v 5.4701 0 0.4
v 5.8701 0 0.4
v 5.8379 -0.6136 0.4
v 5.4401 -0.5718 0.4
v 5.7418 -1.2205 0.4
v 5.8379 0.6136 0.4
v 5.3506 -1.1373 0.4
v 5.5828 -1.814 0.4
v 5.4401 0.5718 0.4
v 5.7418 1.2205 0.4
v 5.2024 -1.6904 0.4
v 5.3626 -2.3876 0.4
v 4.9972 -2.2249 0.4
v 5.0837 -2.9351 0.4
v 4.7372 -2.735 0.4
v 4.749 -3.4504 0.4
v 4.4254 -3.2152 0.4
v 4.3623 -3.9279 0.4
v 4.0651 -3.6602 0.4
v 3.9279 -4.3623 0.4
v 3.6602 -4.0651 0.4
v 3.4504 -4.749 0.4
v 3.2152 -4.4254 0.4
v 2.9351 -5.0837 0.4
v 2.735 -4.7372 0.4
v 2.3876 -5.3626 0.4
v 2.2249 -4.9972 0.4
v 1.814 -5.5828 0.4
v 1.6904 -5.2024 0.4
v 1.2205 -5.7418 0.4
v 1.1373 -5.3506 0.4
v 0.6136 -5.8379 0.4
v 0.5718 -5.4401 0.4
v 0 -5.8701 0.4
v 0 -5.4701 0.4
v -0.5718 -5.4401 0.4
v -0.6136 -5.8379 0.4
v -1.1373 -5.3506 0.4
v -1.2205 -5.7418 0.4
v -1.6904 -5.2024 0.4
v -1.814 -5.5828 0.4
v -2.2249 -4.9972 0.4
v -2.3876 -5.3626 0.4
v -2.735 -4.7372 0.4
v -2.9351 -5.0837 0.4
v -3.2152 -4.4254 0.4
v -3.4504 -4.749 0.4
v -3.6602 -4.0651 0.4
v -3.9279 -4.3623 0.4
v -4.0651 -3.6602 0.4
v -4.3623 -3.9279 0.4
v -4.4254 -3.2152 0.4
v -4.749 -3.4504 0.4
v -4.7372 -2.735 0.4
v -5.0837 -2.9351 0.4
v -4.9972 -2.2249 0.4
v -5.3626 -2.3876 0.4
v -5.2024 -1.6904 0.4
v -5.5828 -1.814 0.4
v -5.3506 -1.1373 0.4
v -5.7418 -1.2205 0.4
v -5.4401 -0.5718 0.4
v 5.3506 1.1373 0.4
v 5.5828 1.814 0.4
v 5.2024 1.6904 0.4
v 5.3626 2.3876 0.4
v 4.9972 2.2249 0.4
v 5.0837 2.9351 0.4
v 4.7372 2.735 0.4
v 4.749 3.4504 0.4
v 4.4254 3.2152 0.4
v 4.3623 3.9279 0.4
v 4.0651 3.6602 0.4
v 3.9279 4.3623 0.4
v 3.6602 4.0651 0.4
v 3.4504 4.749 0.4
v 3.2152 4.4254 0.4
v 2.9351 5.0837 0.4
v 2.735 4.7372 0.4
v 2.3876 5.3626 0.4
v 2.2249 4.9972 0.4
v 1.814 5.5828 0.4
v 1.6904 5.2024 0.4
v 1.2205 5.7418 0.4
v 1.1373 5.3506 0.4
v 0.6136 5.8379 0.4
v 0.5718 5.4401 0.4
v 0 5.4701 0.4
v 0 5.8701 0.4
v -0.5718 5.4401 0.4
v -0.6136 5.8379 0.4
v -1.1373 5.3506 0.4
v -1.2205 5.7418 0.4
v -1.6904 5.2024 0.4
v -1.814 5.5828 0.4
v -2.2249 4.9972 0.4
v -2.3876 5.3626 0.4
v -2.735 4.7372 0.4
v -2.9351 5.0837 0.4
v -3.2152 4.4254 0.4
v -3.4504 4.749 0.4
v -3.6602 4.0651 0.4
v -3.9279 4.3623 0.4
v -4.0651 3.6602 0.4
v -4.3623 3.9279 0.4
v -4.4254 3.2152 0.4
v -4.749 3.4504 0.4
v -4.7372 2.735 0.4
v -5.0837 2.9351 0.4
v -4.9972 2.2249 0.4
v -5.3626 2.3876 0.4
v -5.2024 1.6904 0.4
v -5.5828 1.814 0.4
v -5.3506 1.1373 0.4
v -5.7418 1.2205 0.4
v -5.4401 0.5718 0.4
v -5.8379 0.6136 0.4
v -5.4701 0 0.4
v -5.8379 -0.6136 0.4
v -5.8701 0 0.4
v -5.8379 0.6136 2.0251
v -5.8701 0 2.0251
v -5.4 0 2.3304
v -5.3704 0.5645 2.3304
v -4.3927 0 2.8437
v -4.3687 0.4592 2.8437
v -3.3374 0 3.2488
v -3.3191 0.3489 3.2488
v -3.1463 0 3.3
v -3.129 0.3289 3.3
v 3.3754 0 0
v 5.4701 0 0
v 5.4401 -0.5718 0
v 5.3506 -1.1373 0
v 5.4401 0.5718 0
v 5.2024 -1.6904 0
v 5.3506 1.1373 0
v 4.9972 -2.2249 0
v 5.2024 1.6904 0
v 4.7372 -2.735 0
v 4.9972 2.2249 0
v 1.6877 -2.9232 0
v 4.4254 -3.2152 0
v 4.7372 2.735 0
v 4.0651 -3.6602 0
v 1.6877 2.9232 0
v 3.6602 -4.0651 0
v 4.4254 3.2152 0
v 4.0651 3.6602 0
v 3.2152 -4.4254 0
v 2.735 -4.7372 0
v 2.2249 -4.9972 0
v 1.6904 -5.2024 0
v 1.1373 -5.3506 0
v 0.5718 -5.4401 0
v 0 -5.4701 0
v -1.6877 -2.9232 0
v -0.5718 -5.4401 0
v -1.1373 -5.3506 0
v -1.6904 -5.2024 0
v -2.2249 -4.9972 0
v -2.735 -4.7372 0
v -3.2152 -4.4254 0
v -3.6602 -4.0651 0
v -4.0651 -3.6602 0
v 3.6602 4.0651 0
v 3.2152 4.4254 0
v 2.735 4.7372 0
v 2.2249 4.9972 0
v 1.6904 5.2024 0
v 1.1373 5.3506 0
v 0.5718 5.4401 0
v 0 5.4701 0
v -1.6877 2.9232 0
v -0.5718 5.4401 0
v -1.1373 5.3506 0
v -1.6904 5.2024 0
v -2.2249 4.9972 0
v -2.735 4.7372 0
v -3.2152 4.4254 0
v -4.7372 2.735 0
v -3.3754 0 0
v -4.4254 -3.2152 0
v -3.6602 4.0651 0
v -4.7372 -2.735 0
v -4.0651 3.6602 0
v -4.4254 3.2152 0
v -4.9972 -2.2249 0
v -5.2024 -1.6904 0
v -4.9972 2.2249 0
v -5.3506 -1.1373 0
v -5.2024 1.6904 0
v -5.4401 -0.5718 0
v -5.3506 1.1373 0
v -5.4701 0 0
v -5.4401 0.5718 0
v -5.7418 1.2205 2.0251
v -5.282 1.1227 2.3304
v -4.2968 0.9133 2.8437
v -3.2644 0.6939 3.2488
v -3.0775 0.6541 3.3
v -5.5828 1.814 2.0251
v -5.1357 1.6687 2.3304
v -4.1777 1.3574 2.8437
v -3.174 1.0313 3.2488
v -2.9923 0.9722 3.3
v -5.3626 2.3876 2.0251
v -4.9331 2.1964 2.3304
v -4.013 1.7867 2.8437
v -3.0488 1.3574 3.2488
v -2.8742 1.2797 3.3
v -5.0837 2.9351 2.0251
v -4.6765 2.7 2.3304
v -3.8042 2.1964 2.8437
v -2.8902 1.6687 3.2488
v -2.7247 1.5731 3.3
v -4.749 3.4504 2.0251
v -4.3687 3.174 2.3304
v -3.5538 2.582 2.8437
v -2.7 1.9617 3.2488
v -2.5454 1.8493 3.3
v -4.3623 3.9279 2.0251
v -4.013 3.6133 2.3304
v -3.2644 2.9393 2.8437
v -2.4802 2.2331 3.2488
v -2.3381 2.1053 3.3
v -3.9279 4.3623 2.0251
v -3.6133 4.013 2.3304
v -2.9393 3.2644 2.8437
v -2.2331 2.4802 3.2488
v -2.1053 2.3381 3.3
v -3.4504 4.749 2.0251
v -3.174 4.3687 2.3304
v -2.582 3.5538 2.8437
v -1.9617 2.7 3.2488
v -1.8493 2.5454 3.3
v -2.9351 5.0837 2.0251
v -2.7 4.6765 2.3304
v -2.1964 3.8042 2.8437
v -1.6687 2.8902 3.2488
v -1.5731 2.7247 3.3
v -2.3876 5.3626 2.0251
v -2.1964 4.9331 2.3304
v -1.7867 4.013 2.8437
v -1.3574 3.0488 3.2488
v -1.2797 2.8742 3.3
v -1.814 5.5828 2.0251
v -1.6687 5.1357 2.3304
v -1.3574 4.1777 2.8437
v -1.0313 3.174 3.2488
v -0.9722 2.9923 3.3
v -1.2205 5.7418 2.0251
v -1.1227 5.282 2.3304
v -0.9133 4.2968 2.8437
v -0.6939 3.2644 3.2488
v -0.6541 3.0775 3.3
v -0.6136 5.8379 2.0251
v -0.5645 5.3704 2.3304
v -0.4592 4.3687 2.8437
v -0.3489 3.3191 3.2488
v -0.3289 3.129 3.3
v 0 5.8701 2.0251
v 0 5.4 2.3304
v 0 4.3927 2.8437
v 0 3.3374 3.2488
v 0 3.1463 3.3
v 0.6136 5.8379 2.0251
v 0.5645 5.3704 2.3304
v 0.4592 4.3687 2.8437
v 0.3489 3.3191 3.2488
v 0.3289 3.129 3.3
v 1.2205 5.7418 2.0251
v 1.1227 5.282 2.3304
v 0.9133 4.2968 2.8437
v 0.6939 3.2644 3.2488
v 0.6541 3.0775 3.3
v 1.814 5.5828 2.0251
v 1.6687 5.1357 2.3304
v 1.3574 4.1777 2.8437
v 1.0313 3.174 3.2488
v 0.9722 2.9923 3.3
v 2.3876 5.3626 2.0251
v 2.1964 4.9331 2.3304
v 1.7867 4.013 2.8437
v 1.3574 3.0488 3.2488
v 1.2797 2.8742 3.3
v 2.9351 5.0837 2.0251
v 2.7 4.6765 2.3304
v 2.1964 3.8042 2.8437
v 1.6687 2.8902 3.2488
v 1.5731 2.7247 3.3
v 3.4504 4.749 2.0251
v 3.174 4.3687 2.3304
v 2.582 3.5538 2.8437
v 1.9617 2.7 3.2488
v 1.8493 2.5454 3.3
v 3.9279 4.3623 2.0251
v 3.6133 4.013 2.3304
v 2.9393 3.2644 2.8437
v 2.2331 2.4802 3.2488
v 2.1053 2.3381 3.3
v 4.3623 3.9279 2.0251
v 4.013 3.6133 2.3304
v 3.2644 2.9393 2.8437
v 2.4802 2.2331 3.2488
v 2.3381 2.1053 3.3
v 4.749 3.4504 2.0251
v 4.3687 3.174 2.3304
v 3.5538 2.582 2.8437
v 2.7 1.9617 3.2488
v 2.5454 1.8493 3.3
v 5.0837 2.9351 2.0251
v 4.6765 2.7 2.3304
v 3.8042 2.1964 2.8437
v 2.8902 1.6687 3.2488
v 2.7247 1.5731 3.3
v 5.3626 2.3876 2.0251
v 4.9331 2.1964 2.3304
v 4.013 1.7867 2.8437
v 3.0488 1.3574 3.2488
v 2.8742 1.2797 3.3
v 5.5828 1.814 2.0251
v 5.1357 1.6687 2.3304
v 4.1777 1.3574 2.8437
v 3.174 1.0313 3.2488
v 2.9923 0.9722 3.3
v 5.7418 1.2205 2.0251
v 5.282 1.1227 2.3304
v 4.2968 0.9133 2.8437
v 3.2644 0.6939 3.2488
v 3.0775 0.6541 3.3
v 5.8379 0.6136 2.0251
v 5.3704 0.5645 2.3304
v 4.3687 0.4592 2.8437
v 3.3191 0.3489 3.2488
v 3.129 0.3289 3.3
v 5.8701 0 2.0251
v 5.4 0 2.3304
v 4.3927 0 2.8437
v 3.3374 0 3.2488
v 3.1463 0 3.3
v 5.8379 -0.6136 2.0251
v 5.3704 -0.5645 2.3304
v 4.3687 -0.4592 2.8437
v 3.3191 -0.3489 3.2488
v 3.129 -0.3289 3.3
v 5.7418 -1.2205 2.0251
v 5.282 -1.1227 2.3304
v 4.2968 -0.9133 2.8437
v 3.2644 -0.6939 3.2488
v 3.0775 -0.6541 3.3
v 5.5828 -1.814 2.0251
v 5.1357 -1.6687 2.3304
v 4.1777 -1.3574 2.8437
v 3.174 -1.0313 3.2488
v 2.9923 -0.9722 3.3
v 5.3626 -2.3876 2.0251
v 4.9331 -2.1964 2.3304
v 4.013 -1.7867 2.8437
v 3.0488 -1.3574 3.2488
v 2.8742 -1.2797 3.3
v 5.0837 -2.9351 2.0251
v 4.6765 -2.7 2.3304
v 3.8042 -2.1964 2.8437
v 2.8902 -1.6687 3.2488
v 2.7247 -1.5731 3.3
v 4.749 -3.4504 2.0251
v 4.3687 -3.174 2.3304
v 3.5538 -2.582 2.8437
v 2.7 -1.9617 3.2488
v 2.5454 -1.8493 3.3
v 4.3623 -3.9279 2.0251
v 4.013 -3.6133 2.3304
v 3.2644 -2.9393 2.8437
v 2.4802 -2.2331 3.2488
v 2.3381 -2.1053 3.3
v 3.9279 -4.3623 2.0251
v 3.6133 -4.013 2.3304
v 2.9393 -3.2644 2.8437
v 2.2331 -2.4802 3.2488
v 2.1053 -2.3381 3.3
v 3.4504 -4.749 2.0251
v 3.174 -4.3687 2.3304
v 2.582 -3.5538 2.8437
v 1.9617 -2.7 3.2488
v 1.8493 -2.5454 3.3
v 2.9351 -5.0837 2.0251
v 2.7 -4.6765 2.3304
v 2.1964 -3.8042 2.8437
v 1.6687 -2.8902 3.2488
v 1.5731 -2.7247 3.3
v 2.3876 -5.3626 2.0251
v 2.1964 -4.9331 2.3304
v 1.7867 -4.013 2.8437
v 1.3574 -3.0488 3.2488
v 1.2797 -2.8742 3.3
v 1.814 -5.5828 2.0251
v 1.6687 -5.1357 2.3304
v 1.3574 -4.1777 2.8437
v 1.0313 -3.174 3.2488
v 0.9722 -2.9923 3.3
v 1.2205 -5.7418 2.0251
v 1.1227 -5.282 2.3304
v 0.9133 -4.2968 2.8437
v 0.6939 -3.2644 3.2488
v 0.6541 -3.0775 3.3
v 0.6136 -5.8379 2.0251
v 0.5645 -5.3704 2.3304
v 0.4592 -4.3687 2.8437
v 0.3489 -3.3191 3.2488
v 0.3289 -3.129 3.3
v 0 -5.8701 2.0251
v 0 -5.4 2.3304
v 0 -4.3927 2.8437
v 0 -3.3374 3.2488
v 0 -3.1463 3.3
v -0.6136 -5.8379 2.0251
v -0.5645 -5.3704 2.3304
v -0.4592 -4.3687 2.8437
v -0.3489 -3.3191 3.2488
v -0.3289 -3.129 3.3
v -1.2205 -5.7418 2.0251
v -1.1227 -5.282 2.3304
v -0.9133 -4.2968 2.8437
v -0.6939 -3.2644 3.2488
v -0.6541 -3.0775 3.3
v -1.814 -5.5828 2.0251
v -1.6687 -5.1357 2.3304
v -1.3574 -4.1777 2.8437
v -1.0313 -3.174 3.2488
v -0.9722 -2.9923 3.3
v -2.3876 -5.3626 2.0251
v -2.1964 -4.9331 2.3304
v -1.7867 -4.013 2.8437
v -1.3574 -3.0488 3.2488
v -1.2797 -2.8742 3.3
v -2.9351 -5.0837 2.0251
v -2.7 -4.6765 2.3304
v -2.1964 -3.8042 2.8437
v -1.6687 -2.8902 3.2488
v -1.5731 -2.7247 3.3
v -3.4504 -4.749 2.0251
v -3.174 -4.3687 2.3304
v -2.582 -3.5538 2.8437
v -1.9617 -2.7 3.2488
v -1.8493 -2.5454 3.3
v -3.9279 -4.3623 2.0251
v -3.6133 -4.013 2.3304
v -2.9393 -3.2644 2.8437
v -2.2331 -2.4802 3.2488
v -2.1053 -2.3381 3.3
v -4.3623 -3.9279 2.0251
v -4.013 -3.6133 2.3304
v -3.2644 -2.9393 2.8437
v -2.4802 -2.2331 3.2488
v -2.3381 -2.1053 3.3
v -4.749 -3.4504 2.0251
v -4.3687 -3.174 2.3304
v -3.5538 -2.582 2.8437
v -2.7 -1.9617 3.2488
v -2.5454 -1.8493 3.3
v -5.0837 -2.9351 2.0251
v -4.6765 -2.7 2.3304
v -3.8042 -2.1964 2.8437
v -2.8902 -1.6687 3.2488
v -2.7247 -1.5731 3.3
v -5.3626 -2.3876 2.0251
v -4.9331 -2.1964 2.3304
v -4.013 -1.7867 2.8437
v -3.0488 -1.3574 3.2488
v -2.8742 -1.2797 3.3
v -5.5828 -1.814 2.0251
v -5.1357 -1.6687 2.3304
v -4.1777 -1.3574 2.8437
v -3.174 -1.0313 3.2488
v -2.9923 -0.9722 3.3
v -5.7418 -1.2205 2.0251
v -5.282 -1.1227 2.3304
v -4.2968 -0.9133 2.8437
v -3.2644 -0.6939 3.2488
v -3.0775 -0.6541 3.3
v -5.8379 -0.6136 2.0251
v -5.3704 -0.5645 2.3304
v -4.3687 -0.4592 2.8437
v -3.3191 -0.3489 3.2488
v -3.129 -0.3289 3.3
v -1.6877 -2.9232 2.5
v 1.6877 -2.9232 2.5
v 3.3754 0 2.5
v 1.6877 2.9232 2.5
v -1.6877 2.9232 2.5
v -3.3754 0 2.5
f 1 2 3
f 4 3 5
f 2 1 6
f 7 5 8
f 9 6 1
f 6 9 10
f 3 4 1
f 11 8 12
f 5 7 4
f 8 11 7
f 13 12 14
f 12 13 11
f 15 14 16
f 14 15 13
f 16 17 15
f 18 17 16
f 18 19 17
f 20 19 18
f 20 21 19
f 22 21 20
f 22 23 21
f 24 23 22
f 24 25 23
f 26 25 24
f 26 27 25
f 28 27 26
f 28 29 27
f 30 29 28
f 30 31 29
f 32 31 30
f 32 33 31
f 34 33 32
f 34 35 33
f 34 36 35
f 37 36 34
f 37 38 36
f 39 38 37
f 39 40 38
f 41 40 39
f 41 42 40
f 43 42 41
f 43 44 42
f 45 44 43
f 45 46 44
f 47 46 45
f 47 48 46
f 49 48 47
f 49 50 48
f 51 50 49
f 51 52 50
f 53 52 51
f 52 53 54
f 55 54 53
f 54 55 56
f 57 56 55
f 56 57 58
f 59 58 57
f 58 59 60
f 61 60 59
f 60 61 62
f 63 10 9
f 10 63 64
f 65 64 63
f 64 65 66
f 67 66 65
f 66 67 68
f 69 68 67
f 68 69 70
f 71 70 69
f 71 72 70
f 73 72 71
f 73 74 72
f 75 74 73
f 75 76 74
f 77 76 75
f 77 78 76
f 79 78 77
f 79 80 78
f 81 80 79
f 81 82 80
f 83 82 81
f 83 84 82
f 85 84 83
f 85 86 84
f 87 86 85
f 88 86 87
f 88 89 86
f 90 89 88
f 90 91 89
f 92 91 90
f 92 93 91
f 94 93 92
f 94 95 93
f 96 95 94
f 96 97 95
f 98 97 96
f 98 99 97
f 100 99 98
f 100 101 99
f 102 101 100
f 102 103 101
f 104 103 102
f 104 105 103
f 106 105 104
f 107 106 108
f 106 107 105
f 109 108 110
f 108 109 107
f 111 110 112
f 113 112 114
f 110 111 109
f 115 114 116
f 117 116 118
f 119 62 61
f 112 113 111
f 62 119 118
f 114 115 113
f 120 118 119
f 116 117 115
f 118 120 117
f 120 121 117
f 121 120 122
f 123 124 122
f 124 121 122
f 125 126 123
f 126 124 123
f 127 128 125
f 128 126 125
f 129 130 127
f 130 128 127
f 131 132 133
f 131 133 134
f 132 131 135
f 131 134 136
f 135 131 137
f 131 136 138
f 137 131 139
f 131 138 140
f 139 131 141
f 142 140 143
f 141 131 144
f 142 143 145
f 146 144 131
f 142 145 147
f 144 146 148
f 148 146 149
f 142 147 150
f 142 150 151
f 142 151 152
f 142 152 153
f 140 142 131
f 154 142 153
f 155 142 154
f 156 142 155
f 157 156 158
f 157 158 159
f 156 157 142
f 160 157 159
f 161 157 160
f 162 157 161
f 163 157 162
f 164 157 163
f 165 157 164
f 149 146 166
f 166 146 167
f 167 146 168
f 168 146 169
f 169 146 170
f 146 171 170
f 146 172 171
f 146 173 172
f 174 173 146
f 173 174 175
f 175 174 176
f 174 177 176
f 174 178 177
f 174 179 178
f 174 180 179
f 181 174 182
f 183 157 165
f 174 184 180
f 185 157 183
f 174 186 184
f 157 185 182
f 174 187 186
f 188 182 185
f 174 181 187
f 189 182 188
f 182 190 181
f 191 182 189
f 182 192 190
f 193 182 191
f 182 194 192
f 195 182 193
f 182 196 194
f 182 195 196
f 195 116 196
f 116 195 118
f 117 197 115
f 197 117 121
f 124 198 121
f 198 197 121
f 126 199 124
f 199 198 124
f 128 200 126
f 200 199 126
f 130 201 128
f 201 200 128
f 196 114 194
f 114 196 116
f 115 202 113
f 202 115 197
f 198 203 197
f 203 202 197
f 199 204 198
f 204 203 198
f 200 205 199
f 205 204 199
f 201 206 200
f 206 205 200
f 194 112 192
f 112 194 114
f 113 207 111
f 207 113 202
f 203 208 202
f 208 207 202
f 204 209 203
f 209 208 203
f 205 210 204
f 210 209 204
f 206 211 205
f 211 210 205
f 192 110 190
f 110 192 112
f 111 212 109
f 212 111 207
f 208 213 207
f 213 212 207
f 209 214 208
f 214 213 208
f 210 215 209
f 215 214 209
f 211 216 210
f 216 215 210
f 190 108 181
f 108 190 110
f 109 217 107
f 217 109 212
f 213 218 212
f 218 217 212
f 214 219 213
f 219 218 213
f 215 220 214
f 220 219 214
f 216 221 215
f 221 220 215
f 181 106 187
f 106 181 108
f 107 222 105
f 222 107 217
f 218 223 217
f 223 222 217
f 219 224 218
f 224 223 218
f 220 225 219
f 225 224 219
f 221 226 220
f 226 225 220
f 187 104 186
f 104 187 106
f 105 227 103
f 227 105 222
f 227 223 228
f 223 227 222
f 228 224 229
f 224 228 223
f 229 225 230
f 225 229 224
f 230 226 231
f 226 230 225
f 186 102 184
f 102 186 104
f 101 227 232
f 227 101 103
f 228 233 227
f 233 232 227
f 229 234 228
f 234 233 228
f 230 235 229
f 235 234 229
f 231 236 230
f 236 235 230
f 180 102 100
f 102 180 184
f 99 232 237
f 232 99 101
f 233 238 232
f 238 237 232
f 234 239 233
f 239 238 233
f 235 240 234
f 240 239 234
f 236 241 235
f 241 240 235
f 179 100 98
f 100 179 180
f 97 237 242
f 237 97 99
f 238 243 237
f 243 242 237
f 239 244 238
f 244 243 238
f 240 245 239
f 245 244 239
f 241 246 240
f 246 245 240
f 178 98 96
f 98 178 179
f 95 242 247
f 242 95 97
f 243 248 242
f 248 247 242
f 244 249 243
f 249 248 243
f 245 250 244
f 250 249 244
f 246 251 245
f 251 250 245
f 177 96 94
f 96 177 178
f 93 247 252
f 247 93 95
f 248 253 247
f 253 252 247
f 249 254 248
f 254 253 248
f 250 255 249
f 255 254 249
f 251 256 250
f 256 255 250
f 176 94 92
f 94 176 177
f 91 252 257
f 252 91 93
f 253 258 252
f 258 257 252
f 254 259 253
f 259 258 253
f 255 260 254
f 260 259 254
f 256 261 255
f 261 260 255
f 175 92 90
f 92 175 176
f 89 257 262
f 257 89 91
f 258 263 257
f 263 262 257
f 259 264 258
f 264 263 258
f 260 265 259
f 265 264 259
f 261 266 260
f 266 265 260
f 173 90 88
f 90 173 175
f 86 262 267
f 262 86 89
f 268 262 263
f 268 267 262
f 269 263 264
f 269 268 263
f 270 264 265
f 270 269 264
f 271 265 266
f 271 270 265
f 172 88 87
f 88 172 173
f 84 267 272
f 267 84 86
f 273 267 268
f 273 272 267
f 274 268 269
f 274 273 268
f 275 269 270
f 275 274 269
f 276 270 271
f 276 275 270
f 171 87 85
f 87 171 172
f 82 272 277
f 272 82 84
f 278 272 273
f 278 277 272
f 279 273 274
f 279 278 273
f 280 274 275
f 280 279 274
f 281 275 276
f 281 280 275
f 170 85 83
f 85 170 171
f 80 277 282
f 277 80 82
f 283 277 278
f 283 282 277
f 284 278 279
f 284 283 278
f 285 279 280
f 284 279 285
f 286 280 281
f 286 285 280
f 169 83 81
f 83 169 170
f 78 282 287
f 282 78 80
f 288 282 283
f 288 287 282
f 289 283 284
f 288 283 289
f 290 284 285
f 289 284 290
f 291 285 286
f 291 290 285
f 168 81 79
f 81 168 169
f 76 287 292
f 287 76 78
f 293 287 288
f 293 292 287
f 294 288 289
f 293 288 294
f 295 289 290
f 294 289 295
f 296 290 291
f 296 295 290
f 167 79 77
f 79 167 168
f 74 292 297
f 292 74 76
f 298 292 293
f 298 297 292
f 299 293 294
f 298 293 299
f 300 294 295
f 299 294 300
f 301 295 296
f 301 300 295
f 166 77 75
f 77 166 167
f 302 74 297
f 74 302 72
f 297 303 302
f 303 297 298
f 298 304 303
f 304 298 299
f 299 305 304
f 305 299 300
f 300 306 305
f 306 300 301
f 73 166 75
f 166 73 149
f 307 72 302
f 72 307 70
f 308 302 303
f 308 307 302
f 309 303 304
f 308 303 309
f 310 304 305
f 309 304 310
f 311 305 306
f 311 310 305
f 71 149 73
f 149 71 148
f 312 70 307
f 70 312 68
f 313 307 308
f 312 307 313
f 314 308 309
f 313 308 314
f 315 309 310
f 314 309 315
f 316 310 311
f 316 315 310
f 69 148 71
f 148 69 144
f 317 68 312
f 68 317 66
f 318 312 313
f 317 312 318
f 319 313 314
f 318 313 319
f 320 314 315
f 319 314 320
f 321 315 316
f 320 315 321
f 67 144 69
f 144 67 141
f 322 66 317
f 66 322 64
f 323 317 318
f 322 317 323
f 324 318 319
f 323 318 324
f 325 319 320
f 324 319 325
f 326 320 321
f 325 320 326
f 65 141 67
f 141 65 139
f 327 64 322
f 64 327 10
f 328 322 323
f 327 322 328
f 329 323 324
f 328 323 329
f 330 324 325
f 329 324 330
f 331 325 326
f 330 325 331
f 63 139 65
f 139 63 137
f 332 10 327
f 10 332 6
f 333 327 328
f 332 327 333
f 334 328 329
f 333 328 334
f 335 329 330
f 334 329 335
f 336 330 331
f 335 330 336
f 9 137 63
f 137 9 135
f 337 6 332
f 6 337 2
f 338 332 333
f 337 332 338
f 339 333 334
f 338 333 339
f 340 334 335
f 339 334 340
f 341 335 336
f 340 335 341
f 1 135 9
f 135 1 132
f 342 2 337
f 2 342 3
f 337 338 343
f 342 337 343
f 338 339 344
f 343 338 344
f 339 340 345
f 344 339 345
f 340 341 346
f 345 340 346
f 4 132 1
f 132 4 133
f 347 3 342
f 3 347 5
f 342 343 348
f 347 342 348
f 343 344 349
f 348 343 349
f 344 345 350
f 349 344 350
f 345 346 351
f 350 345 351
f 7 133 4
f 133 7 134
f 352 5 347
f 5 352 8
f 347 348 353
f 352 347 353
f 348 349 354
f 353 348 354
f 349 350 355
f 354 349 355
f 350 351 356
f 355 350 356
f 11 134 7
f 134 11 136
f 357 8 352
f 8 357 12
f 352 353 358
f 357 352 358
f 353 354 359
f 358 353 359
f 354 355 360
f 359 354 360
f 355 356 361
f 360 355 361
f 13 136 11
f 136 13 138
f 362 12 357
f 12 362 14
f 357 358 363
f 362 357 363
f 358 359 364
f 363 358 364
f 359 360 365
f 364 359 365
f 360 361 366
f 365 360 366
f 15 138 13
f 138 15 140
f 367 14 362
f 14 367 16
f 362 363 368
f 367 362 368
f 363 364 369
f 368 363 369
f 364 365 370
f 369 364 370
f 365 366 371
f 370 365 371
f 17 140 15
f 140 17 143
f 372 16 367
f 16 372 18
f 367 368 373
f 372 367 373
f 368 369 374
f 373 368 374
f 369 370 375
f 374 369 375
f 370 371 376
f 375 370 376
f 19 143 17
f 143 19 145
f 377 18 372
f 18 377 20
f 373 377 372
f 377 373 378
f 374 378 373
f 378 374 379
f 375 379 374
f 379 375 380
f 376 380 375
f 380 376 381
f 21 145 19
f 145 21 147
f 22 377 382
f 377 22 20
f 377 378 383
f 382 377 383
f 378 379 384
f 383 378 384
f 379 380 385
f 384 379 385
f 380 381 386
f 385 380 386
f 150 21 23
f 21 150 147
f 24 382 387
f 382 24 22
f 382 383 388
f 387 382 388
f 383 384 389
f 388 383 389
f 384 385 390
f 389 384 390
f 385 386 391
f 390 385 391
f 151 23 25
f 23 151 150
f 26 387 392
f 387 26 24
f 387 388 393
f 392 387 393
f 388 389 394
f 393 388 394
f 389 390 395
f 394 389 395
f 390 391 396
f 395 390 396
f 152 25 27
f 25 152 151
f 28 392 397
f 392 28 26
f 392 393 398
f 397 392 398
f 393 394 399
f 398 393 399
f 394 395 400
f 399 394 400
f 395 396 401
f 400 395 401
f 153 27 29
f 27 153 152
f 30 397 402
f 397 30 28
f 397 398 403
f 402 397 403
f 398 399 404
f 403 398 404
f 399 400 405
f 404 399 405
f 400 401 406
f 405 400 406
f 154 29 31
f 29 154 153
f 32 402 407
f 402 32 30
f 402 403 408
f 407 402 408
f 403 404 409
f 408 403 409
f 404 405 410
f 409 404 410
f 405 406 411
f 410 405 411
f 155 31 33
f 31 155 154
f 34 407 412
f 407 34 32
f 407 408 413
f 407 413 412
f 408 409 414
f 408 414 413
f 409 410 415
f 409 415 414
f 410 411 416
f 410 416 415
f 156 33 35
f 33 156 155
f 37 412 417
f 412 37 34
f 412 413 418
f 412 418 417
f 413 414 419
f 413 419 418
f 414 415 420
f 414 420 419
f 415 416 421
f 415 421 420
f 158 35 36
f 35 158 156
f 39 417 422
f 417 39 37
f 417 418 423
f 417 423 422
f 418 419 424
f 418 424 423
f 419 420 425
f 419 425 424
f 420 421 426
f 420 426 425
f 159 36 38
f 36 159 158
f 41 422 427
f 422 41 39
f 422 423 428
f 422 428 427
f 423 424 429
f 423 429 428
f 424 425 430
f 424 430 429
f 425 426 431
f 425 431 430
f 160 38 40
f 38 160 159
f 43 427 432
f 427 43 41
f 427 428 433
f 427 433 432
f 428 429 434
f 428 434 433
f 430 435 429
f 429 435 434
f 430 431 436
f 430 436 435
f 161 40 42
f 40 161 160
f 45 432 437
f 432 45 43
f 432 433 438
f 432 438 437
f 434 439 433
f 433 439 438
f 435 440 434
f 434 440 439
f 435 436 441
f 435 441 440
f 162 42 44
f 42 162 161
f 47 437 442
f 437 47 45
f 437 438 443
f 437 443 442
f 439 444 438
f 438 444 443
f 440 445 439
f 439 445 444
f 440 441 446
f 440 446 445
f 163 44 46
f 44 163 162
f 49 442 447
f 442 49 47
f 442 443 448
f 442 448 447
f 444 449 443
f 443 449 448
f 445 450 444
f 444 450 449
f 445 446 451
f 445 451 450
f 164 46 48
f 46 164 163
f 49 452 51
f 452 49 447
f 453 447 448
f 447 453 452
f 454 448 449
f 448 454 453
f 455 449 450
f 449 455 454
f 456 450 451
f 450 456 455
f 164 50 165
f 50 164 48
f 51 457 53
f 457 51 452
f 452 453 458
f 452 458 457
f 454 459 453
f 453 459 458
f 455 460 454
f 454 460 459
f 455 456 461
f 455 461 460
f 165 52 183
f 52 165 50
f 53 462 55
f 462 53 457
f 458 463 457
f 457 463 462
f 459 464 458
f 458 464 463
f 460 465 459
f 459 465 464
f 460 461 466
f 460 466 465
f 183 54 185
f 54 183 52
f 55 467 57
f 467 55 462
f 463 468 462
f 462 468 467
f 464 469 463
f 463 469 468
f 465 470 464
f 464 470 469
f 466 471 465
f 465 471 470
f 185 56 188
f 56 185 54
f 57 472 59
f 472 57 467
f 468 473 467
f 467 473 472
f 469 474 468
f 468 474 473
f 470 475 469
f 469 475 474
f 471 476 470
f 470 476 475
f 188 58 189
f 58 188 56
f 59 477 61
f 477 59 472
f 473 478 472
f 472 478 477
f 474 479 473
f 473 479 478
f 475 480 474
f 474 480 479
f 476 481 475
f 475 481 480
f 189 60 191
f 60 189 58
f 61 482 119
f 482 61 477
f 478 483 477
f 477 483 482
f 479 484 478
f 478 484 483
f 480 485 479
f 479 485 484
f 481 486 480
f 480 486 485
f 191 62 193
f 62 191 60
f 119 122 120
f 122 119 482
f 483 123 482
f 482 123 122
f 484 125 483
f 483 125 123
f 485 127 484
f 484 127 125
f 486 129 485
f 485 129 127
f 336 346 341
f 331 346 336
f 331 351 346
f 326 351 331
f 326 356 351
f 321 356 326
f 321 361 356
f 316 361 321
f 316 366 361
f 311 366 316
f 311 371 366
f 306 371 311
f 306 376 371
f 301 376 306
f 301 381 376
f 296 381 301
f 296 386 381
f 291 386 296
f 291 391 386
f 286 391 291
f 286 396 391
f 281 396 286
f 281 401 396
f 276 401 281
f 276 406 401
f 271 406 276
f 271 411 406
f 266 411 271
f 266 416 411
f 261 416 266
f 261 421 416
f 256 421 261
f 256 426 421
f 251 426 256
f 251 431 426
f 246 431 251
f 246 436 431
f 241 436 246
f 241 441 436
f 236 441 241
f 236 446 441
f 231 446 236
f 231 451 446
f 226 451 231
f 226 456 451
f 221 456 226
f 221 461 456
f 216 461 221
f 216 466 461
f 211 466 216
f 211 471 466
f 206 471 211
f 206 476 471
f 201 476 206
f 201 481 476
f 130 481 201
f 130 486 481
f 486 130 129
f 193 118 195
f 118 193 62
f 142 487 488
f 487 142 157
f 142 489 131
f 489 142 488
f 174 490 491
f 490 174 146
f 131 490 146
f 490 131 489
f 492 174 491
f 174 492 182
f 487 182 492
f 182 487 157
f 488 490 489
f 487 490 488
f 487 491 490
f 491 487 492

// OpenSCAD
visibleBoltHole = 4 / 2;
visibleBoltOuterRadius = 253 * 0.07734 / 2;
visibleBoltCoverRadius = visibleBoltOuterRadius / 2;
visibleBoltBezelDepth = visibleBoltOuterRadius * 0.2;
visibleBoltBezel = visibleBoltOuterRadius * 0.2;

boltRadius = 3 / 2;

nutSideToSideDiameter = 5.5;
nutThickness = 2.5;
nutTolerance = 0.2;
nutCornerRadius = circleRadius(r=nutSideToSideDiameter/2, $fn=6);

capHeight = nutThickness + 1.6;

capBase = visibleBoltOuterRadius - visibleBoltBezel * 2;
capRadius = 10.8;
nutOffset = capRadius * cos(asin(nutCornerRadius / capRadius));
capOffset = nutOffset - 0.8 - nutThickness;
echo(nutOffset - 0.8);
echo((capRadius - capOffset) - nutThickness);

function circleRadius(r, $fn) = r / cos(360 / 2 / $fn);

difference() {

    rotate_extrude($fn=60)
    intersection() {
        difference() {
            translate([0,-capOffset])
            circle(r=capRadius);

            *square([nutCornerRadius, nutThickness]);
            *square([boltRadius, nutThickness]);
        }

        square([capRadius, nutOffset - capOffset]);

        difference() {
            square([capBase,20]);
            translate([capBase-nutTolerance*2, 0])
            square([nutTolerance*2, nutTolerance*2]);
        }

    }

    translate([0,0,-nutTolerance])
    cylinder(r=nutCornerRadius + nutTolerance, h=nutThickness + nutTolerance, $fn=6);
}
